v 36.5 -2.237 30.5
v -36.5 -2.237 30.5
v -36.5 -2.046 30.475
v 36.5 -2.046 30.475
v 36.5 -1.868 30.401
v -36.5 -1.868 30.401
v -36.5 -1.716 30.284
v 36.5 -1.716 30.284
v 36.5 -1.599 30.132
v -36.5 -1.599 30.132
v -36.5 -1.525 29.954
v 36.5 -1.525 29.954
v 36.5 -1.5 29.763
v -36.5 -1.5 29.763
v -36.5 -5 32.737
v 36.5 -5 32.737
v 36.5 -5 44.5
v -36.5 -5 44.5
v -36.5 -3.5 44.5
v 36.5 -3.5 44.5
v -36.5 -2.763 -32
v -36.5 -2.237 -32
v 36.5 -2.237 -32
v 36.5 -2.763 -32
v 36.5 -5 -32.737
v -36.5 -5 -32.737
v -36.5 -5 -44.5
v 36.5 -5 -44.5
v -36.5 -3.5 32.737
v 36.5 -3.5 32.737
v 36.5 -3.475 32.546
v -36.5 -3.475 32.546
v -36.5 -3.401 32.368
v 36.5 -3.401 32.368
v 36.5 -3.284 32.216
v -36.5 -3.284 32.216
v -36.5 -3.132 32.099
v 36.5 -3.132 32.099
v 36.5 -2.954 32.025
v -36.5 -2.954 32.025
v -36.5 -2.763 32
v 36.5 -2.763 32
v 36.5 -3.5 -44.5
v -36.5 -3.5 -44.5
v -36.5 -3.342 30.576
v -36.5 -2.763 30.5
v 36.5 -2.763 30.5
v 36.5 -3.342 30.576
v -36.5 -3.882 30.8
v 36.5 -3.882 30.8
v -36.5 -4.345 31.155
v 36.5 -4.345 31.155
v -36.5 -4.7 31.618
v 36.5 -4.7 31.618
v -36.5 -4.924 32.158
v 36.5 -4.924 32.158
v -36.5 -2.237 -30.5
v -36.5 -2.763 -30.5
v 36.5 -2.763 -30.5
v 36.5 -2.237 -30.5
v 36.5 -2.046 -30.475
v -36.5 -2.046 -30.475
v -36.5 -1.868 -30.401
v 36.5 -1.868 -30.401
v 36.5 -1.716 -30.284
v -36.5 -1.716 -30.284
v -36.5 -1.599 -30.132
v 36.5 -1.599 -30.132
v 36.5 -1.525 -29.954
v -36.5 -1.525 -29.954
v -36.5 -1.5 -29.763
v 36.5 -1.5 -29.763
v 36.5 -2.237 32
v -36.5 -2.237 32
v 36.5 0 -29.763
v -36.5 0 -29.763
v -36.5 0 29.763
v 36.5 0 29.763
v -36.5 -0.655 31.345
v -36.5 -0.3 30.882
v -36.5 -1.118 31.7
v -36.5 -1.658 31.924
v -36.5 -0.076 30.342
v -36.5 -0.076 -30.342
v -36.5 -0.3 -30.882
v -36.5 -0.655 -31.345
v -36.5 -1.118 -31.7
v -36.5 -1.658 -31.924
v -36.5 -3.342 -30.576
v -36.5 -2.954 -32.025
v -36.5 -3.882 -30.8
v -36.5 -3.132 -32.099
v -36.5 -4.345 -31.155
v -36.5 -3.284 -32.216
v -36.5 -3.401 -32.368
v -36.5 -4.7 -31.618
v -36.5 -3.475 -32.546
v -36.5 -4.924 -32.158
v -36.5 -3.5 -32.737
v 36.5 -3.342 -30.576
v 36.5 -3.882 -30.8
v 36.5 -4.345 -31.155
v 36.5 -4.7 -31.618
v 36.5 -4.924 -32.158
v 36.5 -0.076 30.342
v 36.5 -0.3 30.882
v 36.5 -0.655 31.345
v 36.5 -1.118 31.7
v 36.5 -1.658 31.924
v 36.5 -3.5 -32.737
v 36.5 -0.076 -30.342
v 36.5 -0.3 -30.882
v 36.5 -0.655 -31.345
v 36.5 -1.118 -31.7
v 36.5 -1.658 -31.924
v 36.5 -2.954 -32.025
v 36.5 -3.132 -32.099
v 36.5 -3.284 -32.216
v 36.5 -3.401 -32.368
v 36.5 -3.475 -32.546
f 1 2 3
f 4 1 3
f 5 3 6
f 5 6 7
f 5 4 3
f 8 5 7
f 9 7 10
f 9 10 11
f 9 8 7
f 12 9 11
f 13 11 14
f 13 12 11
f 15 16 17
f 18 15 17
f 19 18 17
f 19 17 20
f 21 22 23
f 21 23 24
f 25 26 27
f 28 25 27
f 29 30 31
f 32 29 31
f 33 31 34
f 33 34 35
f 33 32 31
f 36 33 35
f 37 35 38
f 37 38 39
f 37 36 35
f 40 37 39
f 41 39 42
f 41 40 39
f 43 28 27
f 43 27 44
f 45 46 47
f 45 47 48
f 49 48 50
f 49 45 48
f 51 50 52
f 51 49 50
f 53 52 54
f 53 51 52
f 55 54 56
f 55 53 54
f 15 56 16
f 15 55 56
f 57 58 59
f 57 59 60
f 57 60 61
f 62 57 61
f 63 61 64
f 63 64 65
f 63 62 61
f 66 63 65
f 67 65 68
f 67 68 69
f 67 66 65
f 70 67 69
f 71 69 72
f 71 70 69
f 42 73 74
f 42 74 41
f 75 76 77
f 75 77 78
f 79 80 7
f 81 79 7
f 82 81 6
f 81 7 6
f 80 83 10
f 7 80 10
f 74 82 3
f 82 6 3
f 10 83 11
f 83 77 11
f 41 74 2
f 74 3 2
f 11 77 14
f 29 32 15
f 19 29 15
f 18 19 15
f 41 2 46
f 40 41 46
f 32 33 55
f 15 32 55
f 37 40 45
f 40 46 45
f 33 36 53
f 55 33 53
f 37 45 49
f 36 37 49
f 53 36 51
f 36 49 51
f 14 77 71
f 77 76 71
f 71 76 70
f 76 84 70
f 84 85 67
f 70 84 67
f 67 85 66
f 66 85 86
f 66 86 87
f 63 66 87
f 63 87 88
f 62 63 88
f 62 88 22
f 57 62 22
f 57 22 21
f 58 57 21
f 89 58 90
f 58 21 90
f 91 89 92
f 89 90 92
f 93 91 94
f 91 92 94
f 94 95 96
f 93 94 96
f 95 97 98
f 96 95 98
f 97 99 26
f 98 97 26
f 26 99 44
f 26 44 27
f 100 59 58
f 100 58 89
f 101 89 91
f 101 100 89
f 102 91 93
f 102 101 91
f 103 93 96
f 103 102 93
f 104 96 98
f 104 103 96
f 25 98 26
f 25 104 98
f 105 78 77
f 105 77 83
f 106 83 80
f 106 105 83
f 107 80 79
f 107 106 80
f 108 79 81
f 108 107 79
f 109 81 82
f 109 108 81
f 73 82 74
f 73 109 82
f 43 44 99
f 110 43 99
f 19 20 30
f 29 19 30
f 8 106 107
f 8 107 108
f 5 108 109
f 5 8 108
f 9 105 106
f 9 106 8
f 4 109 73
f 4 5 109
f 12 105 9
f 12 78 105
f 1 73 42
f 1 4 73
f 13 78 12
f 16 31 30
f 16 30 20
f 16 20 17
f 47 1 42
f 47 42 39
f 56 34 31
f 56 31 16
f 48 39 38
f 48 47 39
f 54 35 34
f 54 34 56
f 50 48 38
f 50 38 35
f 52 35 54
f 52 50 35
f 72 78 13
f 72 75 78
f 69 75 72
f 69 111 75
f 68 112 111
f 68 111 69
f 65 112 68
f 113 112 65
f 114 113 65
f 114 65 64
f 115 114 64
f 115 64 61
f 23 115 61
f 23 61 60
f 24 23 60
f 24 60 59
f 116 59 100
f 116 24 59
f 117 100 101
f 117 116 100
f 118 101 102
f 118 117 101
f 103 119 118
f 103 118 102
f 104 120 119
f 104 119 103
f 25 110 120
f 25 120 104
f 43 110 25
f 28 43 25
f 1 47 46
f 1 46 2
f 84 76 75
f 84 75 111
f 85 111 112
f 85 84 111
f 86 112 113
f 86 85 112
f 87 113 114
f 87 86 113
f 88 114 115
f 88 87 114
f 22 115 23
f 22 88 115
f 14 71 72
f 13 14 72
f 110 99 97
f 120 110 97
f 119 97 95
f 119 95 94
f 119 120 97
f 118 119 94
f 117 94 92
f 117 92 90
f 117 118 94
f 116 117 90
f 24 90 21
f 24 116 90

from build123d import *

# Parameters (mm, degrees)
SKETCH1_W                      = 73
SKETCH1_H                      = 64
BASE_FLANGE1_DEPTH             = 1.5
EDGE_FLANGE1_STRIP_W           = 7.4732
EDGE_FLANGE1_STRIP_H           = 1.5
EDGE_FLANGE1_STRIP_CUT_DEPTH   = 73
EDGE_FLANGE1_STRIP_2_W         = 7.4732
EDGE_FLANGE1_STRIP_2_H         = 1.5
EDGE_FLANGE1_STRIP_CUT_2_DEPTH = 73
EDGE_FLANGE1_DEPTH             = 73
EDGE_FLANGE1_BEND_DEPTH        = 73
EDGE_FLANGE2_STRIP_W           = 7.4732
EDGE_FLANGE2_STRIP_H           = 1.5
EDGE_FLANGE2_STRIP_CUT_DEPTH   = 73
EDGE_FLANGE2_STRIP_2_W         = 7.4732
EDGE_FLANGE2_STRIP_2_H         = 1.5
EDGE_FLANGE2_STRIP_CUT_2_DEPTH = 73
EDGE_FLANGE2_DEPTH             = 73
EDGE_FLANGE2_BEND_DEPTH        = 73


# Sheet-metal steps are written as plain solids
with BuildPart() as part:
    # Sketch1 → Base-Flange1 (new body)
    with BuildSketch(Plane(origin=(0, 0, 0), x_dir=(1, 0, 0), z_dir=(0, 1, 0))):
        Rectangle(SKETCH1_W, SKETCH1_H)
    extrude(amount=-BASE_FLANGE1_DEPTH)

    # Edge-Flange1 strip (across the edge) → Edge-Flange1 strip cut (cut)
    with BuildSketch(Plane(origin=(36.5, -1.5, 32), x_dir=(0, 0, -1), z_dir=(-1, 0, 0))):
        with Locations((-1.5, -0.75)):
            Rectangle(EDGE_FLANGE1_STRIP_W, EDGE_FLANGE1_STRIP_H)
    extrude(amount=EDGE_FLANGE1_STRIP_CUT_DEPTH, mode=Mode.SUBTRACT)

    # Edge-Flange1 strip 2 (across the edge) → Edge-Flange1 strip cut 2 (cut)
    with BuildSketch(Plane(origin=(-36.5, -1.5, -32), x_dir=(0, 0, 1), z_dir=(1, 0, 0))):
        with Locations((-1.5, -0.75)):
            Rectangle(EDGE_FLANGE1_STRIP_2_W, EDGE_FLANGE1_STRIP_2_H)
    extrude(amount=EDGE_FLANGE1_STRIP_CUT_2_DEPTH, mode=Mode.SUBTRACT)

    # Edge-Flange1 section (across the edge) → Edge-Flange1 (add)
    with BuildSketch(Plane(origin=(36.5, -1.5, 32), x_dir=(0, 0, -1), z_dir=(-1, 0, 0))):
        with BuildLine():
            Line((0, 0.7366), (0, 3.5))
            Line((0, 3.5), (1.5, 3.5))
            Line((1.5, 3.5), (1.5, 0.7366))
            ThreePointArc((1.5, 0.7366), (1.715745145, 0.215745145), (2.2366, 0))
            Line((2.2366, 0), (2.2366, -1.5))
            ThreePointArc((2.2366, -1.5), (0.655084973, -0.844915027), (0, 0.7366))
        make_face()
    extrude(amount=EDGE_FLANGE1_DEPTH)

    # Edge-Flange1 section 2 (across the edge) → Edge-Flange1 bend (add)
    with BuildSketch(Plane(origin=(-36.5, -1.5, -32), x_dir=(0, 0, 1), z_dir=(1, 0, 0))):
        with BuildLine():
            Line((0, 0.7366), (0, 3.5))
            Line((0, 3.5), (1.5, 3.5))
            Line((1.5, 3.5), (1.5, 0.7366))
            ThreePointArc((1.5, 0.7366), (1.715745145, 0.215745145), (2.2366, 0))
            Line((2.2366, 0), (2.2366, -1.5))
            ThreePointArc((2.2366, -1.5), (0.655084973, -0.844915027), (0, 0.7366))
        make_face()
    extrude(amount=EDGE_FLANGE1_BEND_DEPTH)

    # Edge-Flange2 strip (across the edge) → Edge-Flange2 strip cut (cut)
    with BuildSketch(Plane(origin=(-36.5, -5, 32), x_dir=(0, 1, 0), z_dir=(1, 0, 0))):
        with Locations((-1.5, -0.75)):
            Rectangle(EDGE_FLANGE2_STRIP_W, EDGE_FLANGE2_STRIP_H)
    extrude(amount=EDGE_FLANGE2_STRIP_CUT_DEPTH, mode=Mode.SUBTRACT)

    # Edge-Flange2 strip 2 (across the edge) → Edge-Flange2 strip cut 2 (cut)
    with BuildSketch(Plane(origin=(36.5, -5, -32), x_dir=(0, 1, 0), z_dir=(-1, 0, 0))):
        with Locations((-1.5, -0.75)):
            Rectangle(EDGE_FLANGE2_STRIP_2_W, EDGE_FLANGE2_STRIP_2_H)
    extrude(amount=EDGE_FLANGE2_STRIP_CUT_2_DEPTH, mode=Mode.SUBTRACT)

    # Edge-Flange2 section (across the edge) → Edge-Flange2 (add)
    with BuildSketch(Plane(origin=(-36.5, -5, 32), x_dir=(0, 1, 0), z_dir=(1, 0, 0))):
        with BuildLine():
            Line((0, 0.7366), (0, 12.5))
            Line((0, 12.5), (1.5, 12.5))
            Line((1.5, 12.5), (1.5, 0.7366))
            ThreePointArc((1.5, 0.7366), (1.715745145, 0.215745145), (2.2366, 0))
            Line((2.2366, 0), (2.2366, -1.5))
            ThreePointArc((2.2366, -1.5), (0.655084973, -0.844915027), (0, 0.7366))
        make_face()
    extrude(amount=EDGE_FLANGE2_DEPTH)

    # Edge-Flange2 section 2 (across the edge) → Edge-Flange2 bend (add)
    with BuildSketch(Plane(origin=(36.5, -5, -32), x_dir=(0, 1, 0), z_dir=(-1, 0, 0))):
        with BuildLine():
            Line((0, 0.7366), (0, 12.5))
            Line((0, 12.5), (1.5, 12.5))
            Line((1.5, 12.5), (1.5, 0.7366))
            ThreePointArc((1.5, 0.7366), (1.715745145, 0.215745145), (2.2366, 0))
            Line((2.2366, 0), (2.2366, -1.5))
            ThreePointArc((2.2366, -1.5), (0.655084973, -0.844915027), (0, 0.7366))
        make_face()
    extrude(amount=EDGE_FLANGE2_BEND_DEPTH)


solid = part.part
